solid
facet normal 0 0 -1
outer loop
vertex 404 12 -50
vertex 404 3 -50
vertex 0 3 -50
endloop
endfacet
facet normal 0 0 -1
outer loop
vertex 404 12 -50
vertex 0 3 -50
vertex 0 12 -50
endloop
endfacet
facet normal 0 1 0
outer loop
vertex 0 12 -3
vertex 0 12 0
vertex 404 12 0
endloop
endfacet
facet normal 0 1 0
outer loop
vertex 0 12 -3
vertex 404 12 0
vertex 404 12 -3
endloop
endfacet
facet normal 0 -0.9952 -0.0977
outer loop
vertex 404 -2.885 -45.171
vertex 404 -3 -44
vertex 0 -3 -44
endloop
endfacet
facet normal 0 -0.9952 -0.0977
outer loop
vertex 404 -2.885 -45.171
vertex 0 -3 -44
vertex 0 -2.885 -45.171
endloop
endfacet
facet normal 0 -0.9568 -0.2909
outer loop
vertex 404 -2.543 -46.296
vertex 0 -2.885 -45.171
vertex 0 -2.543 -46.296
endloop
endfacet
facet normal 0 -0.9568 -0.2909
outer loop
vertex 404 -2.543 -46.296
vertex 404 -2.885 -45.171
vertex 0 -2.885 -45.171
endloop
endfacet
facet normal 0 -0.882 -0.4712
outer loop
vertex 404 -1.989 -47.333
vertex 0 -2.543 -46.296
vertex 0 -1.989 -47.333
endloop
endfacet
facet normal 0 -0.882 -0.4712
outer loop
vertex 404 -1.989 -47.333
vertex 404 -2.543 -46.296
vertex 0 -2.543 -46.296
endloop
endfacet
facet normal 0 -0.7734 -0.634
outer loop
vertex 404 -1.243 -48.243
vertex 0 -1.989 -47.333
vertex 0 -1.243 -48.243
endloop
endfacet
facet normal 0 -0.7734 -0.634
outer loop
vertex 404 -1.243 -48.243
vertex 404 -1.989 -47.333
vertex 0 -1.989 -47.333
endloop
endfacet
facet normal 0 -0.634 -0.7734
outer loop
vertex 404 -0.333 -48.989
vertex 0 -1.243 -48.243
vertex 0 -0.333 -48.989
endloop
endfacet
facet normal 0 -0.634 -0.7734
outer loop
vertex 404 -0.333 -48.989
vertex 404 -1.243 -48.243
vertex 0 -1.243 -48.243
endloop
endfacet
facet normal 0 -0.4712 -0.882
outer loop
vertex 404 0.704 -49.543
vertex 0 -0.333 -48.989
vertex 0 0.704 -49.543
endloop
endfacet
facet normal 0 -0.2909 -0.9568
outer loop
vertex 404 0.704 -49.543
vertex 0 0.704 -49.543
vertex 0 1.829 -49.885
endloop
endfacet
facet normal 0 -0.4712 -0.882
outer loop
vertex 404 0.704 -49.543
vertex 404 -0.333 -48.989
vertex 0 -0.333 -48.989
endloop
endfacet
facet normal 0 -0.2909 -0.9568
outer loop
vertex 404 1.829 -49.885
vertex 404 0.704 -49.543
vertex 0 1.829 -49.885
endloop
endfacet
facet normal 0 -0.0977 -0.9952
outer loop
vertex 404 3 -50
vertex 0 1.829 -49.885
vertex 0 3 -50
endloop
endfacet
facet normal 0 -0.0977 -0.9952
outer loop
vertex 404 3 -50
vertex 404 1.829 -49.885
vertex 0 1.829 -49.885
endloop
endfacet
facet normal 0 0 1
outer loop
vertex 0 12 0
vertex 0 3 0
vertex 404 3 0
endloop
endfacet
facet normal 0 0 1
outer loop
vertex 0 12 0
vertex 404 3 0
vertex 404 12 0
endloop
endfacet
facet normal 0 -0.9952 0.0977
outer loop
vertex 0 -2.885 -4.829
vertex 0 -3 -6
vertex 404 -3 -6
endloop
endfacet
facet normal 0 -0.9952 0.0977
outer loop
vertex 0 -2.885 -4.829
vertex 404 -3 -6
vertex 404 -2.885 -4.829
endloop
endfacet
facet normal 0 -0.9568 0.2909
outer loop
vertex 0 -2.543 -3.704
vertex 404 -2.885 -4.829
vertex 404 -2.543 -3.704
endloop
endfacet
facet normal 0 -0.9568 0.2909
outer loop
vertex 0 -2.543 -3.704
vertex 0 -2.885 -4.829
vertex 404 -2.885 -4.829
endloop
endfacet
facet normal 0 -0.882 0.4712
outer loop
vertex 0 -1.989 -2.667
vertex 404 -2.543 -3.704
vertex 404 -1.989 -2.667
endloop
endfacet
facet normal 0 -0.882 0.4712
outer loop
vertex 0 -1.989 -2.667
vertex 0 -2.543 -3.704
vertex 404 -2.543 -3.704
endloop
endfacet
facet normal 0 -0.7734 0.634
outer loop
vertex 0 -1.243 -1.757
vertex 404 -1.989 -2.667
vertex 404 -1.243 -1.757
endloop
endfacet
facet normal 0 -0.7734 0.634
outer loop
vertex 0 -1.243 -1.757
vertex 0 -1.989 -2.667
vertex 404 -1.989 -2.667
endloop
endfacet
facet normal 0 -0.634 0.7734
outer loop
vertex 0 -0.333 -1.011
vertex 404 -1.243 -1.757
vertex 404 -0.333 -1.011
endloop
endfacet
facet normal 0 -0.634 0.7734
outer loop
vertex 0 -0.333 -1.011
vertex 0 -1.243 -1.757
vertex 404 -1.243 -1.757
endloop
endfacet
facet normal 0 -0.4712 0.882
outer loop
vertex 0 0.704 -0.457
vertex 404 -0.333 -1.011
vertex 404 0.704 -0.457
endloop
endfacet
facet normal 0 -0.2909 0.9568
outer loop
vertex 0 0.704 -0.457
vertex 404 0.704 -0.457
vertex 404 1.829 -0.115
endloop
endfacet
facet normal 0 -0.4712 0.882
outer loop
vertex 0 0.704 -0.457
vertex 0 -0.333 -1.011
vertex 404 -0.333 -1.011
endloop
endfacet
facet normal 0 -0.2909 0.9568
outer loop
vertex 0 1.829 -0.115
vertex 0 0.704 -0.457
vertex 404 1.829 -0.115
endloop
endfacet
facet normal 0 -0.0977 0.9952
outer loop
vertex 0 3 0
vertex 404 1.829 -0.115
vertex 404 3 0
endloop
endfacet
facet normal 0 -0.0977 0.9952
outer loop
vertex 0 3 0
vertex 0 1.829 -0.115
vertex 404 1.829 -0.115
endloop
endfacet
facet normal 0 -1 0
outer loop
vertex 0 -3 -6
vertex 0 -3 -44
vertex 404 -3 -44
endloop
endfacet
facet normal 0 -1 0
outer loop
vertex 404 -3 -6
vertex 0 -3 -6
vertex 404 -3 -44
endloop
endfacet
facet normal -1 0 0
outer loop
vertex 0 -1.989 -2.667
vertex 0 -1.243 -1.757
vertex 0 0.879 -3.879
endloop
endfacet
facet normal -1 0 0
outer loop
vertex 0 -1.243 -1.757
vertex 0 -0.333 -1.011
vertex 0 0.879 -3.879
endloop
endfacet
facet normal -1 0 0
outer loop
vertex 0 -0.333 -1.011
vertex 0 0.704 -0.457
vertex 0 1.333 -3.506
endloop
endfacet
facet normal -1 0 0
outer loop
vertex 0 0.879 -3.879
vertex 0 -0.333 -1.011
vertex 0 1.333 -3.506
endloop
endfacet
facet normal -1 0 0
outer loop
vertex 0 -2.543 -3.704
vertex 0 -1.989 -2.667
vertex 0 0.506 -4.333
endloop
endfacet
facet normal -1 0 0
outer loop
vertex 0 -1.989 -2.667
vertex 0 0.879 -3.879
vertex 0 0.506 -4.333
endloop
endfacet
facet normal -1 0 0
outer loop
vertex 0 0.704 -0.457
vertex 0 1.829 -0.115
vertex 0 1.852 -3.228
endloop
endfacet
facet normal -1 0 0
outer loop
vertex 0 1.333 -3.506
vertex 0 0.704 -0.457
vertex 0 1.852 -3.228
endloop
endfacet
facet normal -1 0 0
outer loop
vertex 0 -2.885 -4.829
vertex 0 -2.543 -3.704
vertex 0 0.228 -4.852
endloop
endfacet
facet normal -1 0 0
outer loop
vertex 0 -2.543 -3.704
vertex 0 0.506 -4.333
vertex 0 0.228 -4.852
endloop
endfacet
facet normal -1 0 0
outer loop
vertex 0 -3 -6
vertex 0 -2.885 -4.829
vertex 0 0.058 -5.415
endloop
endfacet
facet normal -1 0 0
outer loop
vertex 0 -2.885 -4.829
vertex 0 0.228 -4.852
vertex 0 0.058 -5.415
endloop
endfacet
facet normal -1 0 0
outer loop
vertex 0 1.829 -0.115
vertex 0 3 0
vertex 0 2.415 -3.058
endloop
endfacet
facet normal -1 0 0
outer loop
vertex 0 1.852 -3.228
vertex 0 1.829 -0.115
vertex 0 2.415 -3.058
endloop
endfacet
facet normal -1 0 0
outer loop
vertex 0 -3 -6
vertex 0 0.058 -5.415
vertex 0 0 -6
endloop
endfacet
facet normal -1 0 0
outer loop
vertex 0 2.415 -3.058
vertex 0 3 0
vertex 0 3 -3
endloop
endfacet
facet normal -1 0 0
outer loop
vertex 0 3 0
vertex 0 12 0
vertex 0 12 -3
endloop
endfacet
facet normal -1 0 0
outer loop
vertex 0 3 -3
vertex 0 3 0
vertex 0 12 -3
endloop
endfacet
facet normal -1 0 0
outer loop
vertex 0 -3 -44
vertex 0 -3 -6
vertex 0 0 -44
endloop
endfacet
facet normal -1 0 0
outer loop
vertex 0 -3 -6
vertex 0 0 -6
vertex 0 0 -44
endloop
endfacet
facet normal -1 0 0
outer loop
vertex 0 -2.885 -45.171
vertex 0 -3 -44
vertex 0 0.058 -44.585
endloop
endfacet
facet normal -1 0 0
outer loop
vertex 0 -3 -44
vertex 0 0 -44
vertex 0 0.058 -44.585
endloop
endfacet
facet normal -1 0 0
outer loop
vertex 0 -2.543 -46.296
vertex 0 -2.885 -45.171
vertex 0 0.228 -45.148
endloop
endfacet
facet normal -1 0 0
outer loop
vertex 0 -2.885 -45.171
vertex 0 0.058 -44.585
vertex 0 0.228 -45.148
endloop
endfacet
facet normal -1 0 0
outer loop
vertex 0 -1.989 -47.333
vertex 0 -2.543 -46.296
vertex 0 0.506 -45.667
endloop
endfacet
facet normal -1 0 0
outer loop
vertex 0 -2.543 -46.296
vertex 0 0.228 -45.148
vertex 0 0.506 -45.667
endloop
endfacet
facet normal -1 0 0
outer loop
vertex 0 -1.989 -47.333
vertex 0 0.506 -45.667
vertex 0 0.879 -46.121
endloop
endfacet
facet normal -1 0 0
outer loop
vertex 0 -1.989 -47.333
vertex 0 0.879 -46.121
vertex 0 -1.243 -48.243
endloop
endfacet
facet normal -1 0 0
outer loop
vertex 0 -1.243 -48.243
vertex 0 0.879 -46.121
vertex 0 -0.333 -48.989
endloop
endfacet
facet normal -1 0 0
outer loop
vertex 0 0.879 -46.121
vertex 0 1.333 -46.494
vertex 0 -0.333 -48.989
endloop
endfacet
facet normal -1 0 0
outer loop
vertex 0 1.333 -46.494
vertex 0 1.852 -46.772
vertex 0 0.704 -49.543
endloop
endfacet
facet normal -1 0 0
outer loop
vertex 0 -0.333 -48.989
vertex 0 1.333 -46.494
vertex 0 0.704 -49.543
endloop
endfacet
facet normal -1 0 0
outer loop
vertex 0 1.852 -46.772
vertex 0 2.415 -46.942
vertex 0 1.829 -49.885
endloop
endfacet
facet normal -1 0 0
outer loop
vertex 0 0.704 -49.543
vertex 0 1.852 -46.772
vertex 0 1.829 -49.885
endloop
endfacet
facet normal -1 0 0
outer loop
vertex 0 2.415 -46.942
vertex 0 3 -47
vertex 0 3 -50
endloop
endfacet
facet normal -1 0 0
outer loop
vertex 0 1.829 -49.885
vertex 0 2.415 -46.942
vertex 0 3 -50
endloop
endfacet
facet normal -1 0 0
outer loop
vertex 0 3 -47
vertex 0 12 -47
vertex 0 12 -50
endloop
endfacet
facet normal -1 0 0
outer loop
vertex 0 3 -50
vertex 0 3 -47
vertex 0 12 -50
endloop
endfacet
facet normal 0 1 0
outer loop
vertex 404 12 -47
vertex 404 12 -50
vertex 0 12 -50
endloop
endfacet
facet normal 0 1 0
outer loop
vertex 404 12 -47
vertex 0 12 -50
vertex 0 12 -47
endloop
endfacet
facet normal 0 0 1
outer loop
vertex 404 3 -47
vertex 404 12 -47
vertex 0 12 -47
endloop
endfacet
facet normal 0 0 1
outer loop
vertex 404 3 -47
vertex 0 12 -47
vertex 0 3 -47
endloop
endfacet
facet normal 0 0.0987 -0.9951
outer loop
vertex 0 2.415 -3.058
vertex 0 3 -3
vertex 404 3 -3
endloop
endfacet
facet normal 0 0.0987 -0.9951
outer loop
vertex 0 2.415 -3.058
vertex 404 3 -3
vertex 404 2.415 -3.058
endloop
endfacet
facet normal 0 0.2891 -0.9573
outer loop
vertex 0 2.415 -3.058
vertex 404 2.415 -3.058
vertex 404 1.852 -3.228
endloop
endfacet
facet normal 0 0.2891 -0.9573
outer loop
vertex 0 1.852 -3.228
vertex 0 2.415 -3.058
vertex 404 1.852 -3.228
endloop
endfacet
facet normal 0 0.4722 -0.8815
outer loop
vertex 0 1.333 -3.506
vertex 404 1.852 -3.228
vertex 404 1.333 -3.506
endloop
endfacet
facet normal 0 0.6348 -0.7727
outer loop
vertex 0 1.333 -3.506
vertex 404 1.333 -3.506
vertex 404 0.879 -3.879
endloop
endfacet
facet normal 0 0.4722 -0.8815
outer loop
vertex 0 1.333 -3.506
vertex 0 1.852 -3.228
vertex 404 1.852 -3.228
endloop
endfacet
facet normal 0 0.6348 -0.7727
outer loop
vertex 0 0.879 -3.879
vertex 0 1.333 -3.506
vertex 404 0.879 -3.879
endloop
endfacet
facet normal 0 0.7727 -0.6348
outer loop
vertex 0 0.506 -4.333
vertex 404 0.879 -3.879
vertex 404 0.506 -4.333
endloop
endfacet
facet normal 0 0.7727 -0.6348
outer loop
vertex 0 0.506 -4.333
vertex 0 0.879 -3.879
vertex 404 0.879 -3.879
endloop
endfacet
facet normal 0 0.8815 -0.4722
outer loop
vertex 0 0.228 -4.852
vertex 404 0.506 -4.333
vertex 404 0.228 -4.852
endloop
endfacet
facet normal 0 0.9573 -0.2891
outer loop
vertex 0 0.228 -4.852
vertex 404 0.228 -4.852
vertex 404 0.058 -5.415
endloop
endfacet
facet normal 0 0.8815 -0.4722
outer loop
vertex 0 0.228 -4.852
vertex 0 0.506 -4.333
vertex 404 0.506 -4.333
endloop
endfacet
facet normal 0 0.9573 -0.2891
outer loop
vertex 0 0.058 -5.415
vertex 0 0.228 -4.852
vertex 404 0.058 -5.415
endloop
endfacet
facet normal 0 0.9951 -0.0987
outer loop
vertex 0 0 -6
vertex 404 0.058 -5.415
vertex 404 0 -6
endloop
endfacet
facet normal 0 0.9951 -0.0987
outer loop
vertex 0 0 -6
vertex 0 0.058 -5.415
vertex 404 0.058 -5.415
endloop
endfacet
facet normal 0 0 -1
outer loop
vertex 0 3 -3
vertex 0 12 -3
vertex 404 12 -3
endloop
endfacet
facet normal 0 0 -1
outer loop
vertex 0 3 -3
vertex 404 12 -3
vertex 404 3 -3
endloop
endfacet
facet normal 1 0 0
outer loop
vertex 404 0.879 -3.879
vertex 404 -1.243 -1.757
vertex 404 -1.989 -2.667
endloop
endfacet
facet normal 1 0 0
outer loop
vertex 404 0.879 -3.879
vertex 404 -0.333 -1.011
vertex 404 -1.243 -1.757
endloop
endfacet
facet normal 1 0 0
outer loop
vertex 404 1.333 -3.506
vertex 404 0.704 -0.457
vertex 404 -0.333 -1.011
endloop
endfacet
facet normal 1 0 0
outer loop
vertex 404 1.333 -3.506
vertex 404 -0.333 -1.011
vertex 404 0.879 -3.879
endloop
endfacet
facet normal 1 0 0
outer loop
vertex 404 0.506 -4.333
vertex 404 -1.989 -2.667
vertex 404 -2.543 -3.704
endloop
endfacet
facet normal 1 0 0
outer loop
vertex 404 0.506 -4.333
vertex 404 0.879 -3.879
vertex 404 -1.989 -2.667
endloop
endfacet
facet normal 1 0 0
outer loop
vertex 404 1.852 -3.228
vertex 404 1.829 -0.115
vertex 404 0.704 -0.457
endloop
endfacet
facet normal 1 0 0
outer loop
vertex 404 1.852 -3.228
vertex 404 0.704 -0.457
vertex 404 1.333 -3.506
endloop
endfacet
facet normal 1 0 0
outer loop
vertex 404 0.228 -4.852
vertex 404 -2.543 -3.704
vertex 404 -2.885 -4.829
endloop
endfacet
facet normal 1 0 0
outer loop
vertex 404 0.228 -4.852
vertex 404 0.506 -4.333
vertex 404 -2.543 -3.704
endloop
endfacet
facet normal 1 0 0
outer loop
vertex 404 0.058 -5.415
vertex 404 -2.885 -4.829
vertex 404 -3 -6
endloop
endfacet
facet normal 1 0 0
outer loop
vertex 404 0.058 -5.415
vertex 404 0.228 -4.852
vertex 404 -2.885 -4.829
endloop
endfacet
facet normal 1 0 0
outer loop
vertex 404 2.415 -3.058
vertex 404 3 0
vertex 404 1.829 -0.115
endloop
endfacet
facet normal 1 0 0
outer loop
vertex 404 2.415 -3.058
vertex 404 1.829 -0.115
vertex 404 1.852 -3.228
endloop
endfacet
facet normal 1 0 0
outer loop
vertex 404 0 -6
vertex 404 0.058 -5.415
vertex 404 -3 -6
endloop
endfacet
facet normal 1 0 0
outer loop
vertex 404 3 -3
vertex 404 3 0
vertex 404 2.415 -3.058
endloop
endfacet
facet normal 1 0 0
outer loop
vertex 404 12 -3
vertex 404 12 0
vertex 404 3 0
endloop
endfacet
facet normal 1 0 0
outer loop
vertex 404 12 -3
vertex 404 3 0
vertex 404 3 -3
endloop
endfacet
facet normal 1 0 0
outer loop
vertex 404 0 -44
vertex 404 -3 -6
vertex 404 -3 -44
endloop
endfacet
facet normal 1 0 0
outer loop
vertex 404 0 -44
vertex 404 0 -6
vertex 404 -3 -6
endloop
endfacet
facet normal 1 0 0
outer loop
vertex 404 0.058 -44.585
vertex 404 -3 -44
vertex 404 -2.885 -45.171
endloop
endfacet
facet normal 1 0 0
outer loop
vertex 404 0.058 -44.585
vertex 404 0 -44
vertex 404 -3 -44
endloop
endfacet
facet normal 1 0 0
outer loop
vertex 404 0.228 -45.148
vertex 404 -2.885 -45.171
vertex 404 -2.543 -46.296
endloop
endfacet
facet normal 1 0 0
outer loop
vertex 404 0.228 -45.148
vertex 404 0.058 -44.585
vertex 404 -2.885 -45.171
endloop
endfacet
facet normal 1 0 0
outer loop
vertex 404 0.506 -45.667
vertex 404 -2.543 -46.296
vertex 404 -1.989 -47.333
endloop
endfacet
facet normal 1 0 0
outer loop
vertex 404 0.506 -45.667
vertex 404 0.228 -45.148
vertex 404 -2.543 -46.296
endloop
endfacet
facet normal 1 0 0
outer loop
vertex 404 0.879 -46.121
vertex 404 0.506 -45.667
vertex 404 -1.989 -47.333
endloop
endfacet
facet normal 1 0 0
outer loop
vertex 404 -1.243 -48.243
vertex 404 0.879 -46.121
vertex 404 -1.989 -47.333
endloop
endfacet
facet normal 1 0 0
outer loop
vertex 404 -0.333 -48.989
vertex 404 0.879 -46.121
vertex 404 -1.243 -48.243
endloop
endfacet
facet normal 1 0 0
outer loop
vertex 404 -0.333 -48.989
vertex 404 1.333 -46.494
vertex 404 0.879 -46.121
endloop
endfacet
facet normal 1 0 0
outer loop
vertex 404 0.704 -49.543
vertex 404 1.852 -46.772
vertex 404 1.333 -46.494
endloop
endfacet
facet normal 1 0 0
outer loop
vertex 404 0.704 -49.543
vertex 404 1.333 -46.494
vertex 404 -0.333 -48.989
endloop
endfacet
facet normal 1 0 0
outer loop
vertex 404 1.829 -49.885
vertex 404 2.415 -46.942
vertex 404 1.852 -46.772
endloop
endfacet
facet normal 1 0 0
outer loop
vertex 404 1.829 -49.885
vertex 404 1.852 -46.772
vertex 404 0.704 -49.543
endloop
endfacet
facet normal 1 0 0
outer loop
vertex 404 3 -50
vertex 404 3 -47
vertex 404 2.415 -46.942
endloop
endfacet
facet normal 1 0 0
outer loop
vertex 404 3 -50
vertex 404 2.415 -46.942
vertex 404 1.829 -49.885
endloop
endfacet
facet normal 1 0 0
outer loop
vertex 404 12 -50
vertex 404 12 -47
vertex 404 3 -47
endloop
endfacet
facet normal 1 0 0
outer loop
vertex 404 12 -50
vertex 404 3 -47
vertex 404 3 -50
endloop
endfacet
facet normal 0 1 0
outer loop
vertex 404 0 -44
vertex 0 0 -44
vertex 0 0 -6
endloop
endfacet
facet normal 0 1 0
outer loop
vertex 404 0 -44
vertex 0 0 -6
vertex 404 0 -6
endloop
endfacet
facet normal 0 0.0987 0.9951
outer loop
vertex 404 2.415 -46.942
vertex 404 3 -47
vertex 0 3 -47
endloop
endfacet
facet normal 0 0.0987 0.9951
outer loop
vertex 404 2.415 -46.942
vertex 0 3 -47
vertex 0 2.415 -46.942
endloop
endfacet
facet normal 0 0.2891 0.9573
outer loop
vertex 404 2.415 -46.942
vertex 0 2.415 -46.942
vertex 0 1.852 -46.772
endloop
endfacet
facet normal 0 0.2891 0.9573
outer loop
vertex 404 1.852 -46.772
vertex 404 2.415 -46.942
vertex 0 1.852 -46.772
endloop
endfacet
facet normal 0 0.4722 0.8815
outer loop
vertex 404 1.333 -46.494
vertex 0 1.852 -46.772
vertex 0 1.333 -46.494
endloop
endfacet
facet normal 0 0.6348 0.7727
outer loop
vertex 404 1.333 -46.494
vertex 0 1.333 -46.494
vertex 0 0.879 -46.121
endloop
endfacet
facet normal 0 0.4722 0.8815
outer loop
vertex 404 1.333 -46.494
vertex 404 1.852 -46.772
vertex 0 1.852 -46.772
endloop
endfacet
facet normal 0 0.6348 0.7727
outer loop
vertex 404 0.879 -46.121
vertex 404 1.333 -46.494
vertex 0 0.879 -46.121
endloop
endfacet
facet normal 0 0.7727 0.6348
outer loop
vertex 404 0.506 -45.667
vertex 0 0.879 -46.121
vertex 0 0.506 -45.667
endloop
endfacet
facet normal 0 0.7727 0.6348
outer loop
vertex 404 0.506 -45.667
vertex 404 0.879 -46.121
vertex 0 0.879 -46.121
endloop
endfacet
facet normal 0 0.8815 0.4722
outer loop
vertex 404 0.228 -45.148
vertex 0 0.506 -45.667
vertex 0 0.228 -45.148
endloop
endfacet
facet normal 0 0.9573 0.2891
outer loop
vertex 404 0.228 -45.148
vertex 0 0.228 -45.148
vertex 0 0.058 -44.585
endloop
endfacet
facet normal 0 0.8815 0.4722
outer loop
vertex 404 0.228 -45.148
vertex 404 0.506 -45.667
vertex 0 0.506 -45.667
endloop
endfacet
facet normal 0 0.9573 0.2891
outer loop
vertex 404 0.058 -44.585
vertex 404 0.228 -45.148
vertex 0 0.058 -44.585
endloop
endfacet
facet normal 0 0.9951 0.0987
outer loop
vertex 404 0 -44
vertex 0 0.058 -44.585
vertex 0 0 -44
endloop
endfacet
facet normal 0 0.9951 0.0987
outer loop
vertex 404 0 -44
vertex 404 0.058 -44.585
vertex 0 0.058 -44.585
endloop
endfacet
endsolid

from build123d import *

# Parameters (mm, degrees)
ESQUISSE2_W                             = 404
ESQUISSE2_H                             = 50
T_LE_DE_BASE_PLI_E1_DEPTH               = 3
T_LE_PLI_E_SUR_AR_TE1_STRIP_W           = 18
T_LE_PLI_E_SUR_AR_TE1_STRIP_H           = 3
T_LE_PLI_E_SUR_AR_TE1_STRIP_CUT_DEPTH   = 404
T_LE_PLI_E_SUR_AR_TE1_STRIP_2_W         = 18
T_LE_PLI_E_SUR_AR_TE1_STRIP_2_H         = 3
T_LE_PLI_E_SUR_AR_TE1_STRIP_CUT_2_DEPTH = 404
T_LE_PLI_E_SUR_AR_TE1_DEPTH             = 404
T_LE_PLI_E_SUR_AR_TE1_BEND_DEPTH        = 404


# Sheet-metal steps are written as plain solids
with BuildPart() as part:
    # Esquisse2 → Tôle de base pliée1 (new body)
    with BuildSketch(Plane(origin=(0, 0, 0), x_dir=(1, 0, 0), z_dir=(0, 1, 0))):
        with Locations((202, 25)):
            Rectangle(ESQUISSE2_W, ESQUISSE2_H)
    extrude(amount=-T_LE_DE_BASE_PLI_E1_DEPTH)

    # Tôle pliée sur arête1 strip (across the edge) → Tôle pliée sur arête1 strip cut (cut)
    with BuildSketch(Plane(origin=(0, 0, 0), x_dir=(0, 0, -1), z_dir=(1, 0, 0))):
        with Locations((-3, -1.5)):
            Rectangle(T_LE_PLI_E_SUR_AR_TE1_STRIP_W, T_LE_PLI_E_SUR_AR_TE1_STRIP_H)
    extrude(amount=T_LE_PLI_E_SUR_AR_TE1_STRIP_CUT_DEPTH, mode=Mode.SUBTRACT)

    # Tôle pliée sur arête1 strip 2 (across the edge) → Tôle pliée sur arête1 strip cut 2 (cut)
    with BuildSketch(Plane(origin=(404, 0, -50), x_dir=(0, 0, 1), z_dir=(-1, 0, 0))):
        with Locations((-3, -1.5)):
            Rectangle(T_LE_PLI_E_SUR_AR_TE1_STRIP_2_W, T_LE_PLI_E_SUR_AR_TE1_STRIP_2_H)
    extrude(amount=T_LE_PLI_E_SUR_AR_TE1_STRIP_CUT_2_DEPTH, mode=Mode.SUBTRACT)

    # Tôle pliée sur arête1 section (across the edge) → Tôle pliée sur arête1 (add)
    with BuildSketch(Plane(origin=(0, 0, 0), x_dir=(0, 0, -1), z_dir=(1, 0, 0))):
        with BuildLine():
            Line((0, 3), (0, 12))
            Line((0, 12), (3, 12))
            Line((3, 12), (3, 3))
            ThreePointArc((3, 3), (3.878679656, 0.878679656), (6, 0))
            Line((6, 0), (6, -3))
            ThreePointArc((6, -3), (1.757359313, -1.242640687), (0, 3))
        make_face()
    extrude(amount=T_LE_PLI_E_SUR_AR_TE1_DEPTH)

    # Tôle pliée sur arête1 section 2 (across the edge) → Tôle pliée sur arête1 bend (add)
    with BuildSketch(Plane(origin=(404, 0, -50), x_dir=(0, 0, 1), z_dir=(-1, 0, 0))):
        with BuildLine():
            Line((0, 3), (0, 12))
            Line((0, 12), (3, 12))
            Line((3, 12), (3, 3))
            ThreePointArc((3, 3), (3.878679656, 0.878679656), (6, 0))
            Line((6, 0), (6, -3))
            ThreePointArc((6, -3), (1.757359313, -1.242640687), (0, 3))
        make_face()
    extrude(amount=T_LE_PLI_E_SUR_AR_TE1_BEND_DEPTH)


solid = part.part
